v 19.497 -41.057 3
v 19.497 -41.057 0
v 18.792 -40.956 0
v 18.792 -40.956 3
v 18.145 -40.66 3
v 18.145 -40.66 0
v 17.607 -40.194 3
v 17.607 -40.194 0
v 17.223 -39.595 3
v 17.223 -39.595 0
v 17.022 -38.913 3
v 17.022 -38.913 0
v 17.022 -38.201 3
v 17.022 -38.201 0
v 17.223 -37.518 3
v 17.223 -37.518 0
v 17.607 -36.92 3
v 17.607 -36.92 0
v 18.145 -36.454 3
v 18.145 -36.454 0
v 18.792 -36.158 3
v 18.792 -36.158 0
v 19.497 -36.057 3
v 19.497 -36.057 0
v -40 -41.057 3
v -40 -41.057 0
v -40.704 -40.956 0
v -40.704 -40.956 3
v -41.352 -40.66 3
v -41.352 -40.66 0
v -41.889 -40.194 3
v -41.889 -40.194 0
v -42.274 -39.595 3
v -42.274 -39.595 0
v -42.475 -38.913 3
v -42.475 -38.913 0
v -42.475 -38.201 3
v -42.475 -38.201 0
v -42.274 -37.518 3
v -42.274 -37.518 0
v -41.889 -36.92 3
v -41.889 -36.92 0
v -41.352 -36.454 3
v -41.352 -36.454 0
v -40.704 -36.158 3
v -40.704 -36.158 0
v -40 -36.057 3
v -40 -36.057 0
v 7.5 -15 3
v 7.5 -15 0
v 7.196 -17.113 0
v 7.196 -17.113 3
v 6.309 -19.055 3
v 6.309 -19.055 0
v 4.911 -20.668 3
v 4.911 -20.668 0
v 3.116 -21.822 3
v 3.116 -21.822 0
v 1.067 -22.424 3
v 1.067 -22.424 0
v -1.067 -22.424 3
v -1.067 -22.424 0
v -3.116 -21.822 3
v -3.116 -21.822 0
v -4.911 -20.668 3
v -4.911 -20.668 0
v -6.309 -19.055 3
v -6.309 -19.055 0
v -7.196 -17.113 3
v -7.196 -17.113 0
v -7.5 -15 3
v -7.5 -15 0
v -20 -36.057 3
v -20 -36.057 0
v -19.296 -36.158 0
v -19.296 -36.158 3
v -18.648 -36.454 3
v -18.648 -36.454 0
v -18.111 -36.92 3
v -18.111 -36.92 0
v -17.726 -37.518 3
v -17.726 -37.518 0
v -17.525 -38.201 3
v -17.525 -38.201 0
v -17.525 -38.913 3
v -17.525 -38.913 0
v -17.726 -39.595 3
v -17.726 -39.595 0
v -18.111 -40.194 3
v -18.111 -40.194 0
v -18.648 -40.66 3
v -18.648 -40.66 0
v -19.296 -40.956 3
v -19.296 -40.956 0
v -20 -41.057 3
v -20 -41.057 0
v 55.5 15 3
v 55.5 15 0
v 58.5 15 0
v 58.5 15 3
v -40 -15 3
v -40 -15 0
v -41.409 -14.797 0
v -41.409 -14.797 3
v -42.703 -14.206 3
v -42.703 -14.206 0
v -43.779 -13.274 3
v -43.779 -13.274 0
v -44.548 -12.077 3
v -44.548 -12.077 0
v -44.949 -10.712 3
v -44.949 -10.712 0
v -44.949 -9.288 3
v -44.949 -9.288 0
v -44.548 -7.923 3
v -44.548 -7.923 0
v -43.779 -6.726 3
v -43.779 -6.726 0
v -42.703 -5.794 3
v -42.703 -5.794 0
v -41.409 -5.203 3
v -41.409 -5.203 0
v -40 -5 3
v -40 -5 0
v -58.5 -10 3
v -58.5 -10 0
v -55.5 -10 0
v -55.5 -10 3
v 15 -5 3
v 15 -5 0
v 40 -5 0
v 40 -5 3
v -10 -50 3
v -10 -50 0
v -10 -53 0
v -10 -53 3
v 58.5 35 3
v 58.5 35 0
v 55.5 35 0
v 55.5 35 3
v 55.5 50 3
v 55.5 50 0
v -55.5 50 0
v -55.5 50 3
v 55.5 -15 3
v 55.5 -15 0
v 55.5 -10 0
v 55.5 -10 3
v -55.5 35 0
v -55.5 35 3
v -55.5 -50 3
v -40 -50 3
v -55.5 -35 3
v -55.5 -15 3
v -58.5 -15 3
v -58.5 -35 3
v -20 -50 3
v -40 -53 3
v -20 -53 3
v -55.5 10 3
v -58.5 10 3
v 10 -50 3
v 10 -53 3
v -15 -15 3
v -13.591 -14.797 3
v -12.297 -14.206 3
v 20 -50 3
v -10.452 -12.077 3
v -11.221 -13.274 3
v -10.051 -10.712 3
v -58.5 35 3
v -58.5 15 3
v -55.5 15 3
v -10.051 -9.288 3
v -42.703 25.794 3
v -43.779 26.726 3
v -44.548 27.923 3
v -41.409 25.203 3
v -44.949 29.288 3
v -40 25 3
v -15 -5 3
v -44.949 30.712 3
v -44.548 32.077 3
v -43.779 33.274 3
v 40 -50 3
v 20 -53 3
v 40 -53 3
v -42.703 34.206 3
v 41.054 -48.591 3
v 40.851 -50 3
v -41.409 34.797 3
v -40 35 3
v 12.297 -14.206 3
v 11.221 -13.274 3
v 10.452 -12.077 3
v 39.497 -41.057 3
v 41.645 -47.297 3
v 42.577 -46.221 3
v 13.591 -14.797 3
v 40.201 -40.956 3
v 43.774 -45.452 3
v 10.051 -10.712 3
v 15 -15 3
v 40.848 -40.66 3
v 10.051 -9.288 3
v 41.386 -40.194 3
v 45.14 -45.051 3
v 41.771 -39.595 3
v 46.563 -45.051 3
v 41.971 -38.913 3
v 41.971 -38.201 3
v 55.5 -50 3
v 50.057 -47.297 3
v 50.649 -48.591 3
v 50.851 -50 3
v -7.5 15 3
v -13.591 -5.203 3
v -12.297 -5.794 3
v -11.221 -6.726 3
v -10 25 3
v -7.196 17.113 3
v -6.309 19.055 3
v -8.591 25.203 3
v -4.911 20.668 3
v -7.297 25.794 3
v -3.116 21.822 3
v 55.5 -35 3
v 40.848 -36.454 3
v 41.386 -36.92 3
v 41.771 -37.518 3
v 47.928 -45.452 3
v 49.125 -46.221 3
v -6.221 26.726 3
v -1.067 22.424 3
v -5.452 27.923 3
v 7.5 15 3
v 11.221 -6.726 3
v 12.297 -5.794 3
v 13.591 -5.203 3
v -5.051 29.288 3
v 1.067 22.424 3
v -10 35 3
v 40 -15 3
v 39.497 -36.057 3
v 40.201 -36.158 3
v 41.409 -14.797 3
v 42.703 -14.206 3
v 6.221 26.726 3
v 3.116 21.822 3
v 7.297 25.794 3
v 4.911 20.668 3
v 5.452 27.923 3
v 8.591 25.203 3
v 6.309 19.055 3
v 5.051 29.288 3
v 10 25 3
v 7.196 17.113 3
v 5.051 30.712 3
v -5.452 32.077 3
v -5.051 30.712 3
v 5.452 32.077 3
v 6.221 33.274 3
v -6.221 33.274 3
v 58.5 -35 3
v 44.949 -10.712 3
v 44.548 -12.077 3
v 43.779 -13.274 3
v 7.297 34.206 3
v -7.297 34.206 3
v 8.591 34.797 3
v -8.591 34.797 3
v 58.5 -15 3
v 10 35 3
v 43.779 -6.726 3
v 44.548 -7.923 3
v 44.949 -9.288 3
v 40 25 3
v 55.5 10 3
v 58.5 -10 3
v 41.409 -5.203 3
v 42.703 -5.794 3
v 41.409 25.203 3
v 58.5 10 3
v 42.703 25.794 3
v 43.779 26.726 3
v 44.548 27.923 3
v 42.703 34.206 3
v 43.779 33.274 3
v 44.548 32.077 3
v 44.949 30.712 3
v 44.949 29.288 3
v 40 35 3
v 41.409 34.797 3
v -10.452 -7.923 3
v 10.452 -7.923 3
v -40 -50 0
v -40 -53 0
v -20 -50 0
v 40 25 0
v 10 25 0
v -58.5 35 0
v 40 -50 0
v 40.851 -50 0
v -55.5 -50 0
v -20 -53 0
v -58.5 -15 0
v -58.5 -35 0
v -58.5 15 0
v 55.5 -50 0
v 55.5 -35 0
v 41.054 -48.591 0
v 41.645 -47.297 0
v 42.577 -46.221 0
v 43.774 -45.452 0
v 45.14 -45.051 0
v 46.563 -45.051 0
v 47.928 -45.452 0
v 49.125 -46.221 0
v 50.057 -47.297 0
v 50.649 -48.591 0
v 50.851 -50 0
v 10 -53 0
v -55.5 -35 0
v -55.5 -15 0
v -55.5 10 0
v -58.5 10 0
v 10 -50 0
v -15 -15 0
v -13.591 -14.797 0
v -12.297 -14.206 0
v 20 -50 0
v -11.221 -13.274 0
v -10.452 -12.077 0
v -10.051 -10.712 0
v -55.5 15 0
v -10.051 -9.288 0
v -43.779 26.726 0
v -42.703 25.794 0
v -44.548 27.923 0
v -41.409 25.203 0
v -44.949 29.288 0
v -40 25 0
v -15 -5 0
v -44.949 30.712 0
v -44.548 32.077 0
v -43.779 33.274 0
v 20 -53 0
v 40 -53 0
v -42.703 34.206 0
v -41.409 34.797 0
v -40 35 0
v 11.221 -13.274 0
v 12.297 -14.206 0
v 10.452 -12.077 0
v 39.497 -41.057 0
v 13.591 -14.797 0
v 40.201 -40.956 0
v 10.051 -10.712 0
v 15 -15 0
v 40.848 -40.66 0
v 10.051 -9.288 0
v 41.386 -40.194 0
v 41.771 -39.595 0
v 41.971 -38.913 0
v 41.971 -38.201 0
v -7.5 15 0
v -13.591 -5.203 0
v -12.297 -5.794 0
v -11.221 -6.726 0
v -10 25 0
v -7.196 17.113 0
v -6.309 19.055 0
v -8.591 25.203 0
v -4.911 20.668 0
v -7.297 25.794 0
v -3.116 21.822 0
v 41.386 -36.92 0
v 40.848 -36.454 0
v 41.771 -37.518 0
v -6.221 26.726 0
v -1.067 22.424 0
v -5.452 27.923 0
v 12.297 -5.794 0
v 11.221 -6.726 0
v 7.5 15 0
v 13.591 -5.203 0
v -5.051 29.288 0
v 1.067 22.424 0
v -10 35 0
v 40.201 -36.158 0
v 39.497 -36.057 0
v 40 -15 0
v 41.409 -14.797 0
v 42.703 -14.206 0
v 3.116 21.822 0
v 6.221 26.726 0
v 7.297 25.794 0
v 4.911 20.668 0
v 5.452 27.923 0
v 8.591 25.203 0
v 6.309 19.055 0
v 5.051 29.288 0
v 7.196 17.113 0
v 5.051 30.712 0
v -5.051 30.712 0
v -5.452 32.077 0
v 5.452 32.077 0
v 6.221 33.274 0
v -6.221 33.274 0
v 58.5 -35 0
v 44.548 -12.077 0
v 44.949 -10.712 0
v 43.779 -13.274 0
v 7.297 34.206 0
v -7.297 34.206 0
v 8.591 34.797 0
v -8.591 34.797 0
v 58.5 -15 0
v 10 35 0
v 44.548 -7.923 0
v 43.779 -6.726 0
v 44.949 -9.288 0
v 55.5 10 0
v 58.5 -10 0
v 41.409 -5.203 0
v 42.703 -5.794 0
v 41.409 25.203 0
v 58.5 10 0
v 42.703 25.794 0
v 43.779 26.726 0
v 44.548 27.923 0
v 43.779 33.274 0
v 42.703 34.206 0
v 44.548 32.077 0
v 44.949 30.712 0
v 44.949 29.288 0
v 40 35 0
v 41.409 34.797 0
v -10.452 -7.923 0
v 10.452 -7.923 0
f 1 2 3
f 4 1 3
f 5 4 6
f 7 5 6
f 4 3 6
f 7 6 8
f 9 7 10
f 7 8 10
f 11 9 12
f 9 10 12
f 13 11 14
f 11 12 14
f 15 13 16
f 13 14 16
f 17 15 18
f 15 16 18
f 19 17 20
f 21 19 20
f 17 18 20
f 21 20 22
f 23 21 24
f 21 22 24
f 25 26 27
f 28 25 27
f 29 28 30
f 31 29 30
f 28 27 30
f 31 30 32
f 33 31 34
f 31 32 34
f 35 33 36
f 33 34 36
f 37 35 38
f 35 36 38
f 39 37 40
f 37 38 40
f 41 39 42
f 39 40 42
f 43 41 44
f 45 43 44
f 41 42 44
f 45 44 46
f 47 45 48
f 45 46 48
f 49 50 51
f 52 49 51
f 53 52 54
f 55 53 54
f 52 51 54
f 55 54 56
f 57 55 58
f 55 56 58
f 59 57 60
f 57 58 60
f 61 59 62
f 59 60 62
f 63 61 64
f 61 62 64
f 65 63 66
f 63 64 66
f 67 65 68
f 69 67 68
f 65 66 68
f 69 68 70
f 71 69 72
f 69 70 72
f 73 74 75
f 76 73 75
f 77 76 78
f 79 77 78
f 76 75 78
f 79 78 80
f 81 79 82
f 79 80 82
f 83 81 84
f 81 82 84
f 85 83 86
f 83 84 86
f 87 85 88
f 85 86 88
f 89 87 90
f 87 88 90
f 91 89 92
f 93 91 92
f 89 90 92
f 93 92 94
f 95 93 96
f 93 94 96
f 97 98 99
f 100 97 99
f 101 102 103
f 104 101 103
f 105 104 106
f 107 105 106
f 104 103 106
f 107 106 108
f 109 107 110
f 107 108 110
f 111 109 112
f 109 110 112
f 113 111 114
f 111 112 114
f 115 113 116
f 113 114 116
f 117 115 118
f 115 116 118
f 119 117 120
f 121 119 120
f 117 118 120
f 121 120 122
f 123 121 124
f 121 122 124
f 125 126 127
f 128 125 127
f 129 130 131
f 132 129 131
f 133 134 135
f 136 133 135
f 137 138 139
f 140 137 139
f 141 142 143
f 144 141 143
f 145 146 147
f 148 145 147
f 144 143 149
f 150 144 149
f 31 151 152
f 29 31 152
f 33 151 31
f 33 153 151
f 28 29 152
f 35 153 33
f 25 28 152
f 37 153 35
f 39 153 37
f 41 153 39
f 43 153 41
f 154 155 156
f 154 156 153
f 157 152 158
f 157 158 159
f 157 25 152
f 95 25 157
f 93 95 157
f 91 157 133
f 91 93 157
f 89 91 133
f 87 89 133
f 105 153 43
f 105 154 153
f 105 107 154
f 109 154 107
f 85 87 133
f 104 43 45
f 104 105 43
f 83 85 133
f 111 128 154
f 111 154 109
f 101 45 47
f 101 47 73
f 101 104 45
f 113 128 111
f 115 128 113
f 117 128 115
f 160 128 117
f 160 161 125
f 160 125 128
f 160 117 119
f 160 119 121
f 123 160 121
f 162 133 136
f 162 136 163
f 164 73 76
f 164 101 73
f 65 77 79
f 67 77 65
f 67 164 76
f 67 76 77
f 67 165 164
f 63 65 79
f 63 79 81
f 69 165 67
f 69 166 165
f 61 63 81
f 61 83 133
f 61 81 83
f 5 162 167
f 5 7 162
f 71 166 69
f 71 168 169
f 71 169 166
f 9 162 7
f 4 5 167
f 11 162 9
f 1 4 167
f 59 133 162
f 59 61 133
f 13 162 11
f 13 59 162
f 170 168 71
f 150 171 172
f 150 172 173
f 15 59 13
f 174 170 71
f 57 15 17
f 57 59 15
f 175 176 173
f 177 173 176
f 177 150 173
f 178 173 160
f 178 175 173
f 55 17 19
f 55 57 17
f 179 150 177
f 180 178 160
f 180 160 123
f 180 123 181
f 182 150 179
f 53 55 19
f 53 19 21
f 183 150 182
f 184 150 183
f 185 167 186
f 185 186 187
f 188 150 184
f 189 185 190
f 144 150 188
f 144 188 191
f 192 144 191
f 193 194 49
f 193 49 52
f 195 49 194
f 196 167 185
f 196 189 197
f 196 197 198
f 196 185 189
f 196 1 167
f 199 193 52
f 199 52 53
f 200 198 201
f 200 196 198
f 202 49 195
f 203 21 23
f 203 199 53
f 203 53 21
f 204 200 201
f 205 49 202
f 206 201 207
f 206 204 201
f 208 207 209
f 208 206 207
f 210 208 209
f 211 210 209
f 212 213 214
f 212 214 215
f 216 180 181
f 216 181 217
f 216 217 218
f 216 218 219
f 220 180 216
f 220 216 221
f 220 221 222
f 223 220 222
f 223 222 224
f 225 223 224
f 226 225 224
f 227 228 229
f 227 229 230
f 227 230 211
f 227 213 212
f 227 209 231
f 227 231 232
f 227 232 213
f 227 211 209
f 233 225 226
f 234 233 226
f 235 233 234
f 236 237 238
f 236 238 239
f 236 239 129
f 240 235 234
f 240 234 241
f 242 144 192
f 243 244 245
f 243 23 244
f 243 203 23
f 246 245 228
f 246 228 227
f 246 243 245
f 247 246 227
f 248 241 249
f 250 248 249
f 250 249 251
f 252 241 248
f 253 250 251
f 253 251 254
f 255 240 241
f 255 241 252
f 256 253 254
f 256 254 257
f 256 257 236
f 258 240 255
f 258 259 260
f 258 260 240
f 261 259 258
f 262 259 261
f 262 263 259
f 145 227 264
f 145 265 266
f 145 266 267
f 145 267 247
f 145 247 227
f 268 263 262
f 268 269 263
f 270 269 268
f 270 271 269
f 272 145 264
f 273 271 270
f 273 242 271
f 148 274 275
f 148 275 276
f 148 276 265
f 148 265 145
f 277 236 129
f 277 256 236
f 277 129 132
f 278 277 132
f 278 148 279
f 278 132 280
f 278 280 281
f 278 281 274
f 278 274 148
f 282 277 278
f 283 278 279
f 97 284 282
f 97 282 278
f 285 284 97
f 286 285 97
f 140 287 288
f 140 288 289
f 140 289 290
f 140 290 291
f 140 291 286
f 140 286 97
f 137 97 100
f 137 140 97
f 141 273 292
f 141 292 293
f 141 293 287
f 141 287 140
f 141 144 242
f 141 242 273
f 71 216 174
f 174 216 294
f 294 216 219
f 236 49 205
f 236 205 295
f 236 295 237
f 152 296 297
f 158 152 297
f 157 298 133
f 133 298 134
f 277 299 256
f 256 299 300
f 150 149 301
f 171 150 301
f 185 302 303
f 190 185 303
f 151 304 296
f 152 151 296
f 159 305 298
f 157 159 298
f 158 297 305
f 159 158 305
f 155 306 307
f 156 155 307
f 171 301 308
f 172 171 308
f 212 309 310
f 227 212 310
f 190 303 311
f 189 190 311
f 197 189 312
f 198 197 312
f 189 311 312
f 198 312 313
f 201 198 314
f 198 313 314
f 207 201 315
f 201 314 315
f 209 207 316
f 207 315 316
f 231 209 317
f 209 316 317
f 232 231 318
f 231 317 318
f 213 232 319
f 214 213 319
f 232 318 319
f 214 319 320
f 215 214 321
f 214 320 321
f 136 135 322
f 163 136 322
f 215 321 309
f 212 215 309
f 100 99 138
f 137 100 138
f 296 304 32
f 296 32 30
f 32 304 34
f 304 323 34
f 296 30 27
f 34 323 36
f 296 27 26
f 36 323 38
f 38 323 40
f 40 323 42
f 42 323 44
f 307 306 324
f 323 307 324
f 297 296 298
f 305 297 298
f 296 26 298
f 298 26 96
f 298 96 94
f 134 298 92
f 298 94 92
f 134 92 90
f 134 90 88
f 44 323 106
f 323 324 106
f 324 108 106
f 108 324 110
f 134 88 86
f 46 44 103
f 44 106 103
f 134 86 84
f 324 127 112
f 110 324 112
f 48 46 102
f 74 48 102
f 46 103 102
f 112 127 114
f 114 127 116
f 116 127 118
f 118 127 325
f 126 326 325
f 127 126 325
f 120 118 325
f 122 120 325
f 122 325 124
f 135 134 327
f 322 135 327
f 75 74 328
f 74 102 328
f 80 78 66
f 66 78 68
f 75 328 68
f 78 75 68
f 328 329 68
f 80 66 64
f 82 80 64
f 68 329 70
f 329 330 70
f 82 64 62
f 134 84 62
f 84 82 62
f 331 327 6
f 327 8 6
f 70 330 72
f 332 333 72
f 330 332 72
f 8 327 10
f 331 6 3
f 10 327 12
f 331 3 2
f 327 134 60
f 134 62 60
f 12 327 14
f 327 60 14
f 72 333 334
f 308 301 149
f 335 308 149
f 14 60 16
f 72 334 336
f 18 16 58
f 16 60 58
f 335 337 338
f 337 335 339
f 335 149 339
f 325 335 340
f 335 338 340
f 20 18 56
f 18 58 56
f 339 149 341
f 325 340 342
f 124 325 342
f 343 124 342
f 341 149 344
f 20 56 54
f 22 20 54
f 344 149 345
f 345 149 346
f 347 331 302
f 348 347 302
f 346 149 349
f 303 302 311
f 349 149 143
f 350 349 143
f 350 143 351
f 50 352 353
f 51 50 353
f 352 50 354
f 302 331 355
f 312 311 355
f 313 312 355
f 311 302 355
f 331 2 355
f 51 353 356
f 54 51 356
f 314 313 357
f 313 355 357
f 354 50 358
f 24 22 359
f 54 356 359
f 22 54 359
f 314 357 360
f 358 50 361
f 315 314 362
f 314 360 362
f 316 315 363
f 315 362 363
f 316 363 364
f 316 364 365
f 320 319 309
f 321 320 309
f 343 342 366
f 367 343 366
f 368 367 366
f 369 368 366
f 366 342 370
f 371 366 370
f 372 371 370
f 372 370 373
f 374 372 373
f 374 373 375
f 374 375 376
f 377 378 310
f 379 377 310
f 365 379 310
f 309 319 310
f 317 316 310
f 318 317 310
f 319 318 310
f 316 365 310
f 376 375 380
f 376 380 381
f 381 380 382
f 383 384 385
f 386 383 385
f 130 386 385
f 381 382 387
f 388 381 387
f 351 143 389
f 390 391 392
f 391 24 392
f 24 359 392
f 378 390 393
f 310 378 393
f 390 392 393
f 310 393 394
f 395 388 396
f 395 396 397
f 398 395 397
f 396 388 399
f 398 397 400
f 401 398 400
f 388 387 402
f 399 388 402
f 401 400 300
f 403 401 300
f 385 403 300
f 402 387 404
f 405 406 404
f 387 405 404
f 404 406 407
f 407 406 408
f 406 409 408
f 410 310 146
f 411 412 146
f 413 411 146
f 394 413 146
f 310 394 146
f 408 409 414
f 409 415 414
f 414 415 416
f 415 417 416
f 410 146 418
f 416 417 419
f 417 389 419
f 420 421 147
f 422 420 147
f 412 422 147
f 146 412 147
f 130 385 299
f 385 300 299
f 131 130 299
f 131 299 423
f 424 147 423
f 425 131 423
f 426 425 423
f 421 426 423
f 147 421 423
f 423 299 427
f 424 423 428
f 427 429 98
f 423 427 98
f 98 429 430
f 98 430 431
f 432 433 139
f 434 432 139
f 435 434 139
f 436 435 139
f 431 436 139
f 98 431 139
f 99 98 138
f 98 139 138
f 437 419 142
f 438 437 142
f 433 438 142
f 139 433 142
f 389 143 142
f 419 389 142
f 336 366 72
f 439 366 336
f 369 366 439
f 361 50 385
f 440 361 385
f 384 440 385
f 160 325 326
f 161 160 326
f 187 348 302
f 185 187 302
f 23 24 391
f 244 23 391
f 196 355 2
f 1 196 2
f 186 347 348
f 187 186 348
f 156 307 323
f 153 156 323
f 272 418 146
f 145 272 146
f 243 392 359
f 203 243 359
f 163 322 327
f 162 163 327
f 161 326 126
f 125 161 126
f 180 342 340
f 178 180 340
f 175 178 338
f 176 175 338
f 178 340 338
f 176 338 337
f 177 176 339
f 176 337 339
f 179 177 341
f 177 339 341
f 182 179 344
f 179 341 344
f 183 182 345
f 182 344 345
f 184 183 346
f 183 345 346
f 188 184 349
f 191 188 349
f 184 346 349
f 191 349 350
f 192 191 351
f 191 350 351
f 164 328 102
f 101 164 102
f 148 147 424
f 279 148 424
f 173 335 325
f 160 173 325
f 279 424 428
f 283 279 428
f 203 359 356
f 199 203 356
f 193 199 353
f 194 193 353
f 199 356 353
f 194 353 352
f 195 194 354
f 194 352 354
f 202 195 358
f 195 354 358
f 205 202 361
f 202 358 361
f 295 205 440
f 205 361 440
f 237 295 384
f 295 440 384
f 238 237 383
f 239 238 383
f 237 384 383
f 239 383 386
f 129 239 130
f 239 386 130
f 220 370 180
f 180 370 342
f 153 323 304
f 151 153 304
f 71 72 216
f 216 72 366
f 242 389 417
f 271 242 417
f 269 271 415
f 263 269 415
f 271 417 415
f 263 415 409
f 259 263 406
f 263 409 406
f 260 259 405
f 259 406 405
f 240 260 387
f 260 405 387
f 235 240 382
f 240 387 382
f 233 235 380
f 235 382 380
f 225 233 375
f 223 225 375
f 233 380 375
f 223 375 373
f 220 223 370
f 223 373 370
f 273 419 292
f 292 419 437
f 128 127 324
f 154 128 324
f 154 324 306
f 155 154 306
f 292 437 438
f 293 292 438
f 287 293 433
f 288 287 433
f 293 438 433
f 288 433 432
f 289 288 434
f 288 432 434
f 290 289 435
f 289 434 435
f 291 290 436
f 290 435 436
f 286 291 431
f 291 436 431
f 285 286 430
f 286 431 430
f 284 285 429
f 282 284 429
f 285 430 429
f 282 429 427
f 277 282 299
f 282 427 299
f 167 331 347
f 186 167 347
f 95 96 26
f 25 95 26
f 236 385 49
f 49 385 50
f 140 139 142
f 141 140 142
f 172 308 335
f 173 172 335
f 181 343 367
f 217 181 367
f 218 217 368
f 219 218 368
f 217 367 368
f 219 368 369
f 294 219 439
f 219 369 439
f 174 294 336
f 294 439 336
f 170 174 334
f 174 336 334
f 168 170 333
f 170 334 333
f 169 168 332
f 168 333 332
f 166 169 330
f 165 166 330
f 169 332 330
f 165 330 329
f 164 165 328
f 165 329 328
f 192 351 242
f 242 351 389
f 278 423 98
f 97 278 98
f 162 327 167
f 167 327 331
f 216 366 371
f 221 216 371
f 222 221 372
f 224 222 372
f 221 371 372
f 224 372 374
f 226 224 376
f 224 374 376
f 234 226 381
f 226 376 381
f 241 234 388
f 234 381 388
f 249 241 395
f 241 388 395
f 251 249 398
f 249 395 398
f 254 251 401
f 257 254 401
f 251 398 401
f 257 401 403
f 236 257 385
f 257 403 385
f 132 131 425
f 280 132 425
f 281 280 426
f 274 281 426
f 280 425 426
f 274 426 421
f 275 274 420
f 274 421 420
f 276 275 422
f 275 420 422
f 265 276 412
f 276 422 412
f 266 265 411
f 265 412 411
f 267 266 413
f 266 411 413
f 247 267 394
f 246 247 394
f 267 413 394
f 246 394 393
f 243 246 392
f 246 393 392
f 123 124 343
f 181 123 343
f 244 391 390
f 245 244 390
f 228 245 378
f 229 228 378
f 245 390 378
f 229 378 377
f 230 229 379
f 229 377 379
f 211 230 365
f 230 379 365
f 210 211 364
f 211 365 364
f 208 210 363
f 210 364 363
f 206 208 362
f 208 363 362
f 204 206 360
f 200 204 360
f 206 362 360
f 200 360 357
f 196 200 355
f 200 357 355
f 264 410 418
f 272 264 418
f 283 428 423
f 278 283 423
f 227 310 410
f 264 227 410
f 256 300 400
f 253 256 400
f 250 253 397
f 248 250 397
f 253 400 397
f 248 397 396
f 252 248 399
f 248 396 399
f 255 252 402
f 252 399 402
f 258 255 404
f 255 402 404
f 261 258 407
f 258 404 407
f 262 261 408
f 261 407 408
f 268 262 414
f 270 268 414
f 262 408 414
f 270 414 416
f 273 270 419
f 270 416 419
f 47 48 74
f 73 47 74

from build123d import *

# Parameters (mm, degrees)
BOSS_EXTRUDE1_DEPTH = 3


with BuildPart() as part:
    # Sketch1 → Boss-Extrude1 (new body)
    with BuildSketch(Plane.XY):
        with BuildLine():
            Line((-55.5, -50), (-40, -50))
            Line((-40, -50), (-40, -53))
            Line((-40, -53), (-20, -53))
            Line((-20, -53), (-20, -50))
            Line((-20, -50), (-10, -50))
            Line((-10, -50), (-10, -53))
            Line((-10, -53), (10, -53))
            Line((10, -53), (10, -50))
            Line((10, -50), (20, -50))
            Line((20, -50), (20, -53))
            Line((20, -53), (40, -53))
            Line((40, -53), (40, -50))
            Line((40, -50), (40.851130485, -50))
            ThreePointArc((40.851130485, -50), (45.851130485, -45), (50.851130485, -50))
            Line((50.851130485, -50), (55.5, -50))
            Line((55.5, -50), (55.5, -35))
            Line((55.5, -35), (58.5, -35))
            Line((58.5, -35), (58.5, -15))
            Line((58.5, -15), (55.5, -15))
            Line((55.5, -15), (55.5, -10))
            Line((55.5, -10), (58.5, -10))
            Line((58.5, -10), (58.5, 10))
            Line((58.5, 10), (55.5, 10))
            Line((55.5, 10), (55.5, 15))
            Line((55.5, 15), (58.5, 15))
            Line((58.5, 15), (58.5, 35))
            Line((58.5, 35), (55.5, 35))
            Line((55.5, 35), (55.5, 50))
            Line((55.5, 50), (-55.5, 50))
            Line((-55.5, 50), (-55.5, 35))
            Line((-55.5, 35), (-58.5, 35))
            Line((-58.5, 35), (-58.5, 15))
            Line((-58.5, 15), (-55.5, 15))
            Line((-55.5, 15), (-55.5, 10))
            Line((-55.5, 10), (-58.5, 10))
            Line((-58.5, 10), (-58.5, -10))
            Line((-58.5, -10), (-55.5, -10))
            Line((-55.5, -10), (-55.5, -15))
            Line((-55.5, -15), (-58.5, -15))
            Line((-58.5, -15), (-58.5, -35))
            Line((-58.5, -35), (-55.5, -35))
            Line((-55.5, -35), (-55.5, -50))
        make_face()
        with BuildLine():
            Line((-40, 35), (-10, 35))
            ThreePointArc((-10, 35), (-5, 30), (-10, 25))
            Line((-10, 25), (-40, 25))
            ThreePointArc((-40, 25), (-45, 30), (-40, 35))
        make_face(mode=Mode.SUBTRACT)
        with BuildLine():
            Line((10, 35), (40, 35))
            ThreePointArc((40, 35), (45, 30), (40, 25))
            Line((40, 25), (10, 25))
            ThreePointArc((10, 25), (5, 30), (10, 35))
        make_face(mode=Mode.SUBTRACT)
        with BuildLine():
            Line((-7.5, -15), (-7.5, 15))
            ThreePointArc((-7.5, 15), (0, 22.5), (7.5, 15))
            Line((7.5, 15), (7.5, -15))
            ThreePointArc((7.5, -15), (0, -22.5), (-7.5, -15))
        make_face(mode=Mode.SUBTRACT)
        with BuildLine():
            Line((-40, -5), (-15, -5))
            ThreePointArc((-15, -5), (-10, -10), (-15, -15))
            Line((-15, -15), (-40, -15))
            ThreePointArc((-40, -15), (-45, -10), (-40, -5))
        make_face(mode=Mode.SUBTRACT)
        with BuildLine():
            Line((15, -5), (40, -5))
            ThreePointArc((40, -5), (45, -10), (40, -15))
            Line((40, -15), (15, -15))
            ThreePointArc((15, -15), (10, -10), (15, -5))
        make_face(mode=Mode.SUBTRACT)
        with BuildLine():
            Line((-40, -36.056835362), (-20, -36.056835362))
            ThreePointArc((-20, -36.056835362), (-17.5, -38.556835362), (-20, -41.056835362))
            Line((-20, -41.056835362), (-40, -41.056835362))
            ThreePointArc((-40, -41.056835362), (-42.5, -38.556835362), (-40, -36.056835362))
        make_face(mode=Mode.SUBTRACT)
        with BuildLine():
            Line((39.496814851, -41.056835362), (19.496814851, -41.056835362))
            ThreePointArc((19.496814851, -41.056835362), (16.996814851, -38.556835362), (19.496814851, -36.056835362))
            Line((19.496814851, -36.056835362), (39.496814851, -36.056835362))
            ThreePointArc((39.496814851, -36.056835362), (41.996814851, -38.556835362), (39.496814851, -41.056835362))
        make_face(mode=Mode.SUBTRACT)
    extrude(amount=BOSS_EXTRUDE1_DEPTH)


solid = part.part
